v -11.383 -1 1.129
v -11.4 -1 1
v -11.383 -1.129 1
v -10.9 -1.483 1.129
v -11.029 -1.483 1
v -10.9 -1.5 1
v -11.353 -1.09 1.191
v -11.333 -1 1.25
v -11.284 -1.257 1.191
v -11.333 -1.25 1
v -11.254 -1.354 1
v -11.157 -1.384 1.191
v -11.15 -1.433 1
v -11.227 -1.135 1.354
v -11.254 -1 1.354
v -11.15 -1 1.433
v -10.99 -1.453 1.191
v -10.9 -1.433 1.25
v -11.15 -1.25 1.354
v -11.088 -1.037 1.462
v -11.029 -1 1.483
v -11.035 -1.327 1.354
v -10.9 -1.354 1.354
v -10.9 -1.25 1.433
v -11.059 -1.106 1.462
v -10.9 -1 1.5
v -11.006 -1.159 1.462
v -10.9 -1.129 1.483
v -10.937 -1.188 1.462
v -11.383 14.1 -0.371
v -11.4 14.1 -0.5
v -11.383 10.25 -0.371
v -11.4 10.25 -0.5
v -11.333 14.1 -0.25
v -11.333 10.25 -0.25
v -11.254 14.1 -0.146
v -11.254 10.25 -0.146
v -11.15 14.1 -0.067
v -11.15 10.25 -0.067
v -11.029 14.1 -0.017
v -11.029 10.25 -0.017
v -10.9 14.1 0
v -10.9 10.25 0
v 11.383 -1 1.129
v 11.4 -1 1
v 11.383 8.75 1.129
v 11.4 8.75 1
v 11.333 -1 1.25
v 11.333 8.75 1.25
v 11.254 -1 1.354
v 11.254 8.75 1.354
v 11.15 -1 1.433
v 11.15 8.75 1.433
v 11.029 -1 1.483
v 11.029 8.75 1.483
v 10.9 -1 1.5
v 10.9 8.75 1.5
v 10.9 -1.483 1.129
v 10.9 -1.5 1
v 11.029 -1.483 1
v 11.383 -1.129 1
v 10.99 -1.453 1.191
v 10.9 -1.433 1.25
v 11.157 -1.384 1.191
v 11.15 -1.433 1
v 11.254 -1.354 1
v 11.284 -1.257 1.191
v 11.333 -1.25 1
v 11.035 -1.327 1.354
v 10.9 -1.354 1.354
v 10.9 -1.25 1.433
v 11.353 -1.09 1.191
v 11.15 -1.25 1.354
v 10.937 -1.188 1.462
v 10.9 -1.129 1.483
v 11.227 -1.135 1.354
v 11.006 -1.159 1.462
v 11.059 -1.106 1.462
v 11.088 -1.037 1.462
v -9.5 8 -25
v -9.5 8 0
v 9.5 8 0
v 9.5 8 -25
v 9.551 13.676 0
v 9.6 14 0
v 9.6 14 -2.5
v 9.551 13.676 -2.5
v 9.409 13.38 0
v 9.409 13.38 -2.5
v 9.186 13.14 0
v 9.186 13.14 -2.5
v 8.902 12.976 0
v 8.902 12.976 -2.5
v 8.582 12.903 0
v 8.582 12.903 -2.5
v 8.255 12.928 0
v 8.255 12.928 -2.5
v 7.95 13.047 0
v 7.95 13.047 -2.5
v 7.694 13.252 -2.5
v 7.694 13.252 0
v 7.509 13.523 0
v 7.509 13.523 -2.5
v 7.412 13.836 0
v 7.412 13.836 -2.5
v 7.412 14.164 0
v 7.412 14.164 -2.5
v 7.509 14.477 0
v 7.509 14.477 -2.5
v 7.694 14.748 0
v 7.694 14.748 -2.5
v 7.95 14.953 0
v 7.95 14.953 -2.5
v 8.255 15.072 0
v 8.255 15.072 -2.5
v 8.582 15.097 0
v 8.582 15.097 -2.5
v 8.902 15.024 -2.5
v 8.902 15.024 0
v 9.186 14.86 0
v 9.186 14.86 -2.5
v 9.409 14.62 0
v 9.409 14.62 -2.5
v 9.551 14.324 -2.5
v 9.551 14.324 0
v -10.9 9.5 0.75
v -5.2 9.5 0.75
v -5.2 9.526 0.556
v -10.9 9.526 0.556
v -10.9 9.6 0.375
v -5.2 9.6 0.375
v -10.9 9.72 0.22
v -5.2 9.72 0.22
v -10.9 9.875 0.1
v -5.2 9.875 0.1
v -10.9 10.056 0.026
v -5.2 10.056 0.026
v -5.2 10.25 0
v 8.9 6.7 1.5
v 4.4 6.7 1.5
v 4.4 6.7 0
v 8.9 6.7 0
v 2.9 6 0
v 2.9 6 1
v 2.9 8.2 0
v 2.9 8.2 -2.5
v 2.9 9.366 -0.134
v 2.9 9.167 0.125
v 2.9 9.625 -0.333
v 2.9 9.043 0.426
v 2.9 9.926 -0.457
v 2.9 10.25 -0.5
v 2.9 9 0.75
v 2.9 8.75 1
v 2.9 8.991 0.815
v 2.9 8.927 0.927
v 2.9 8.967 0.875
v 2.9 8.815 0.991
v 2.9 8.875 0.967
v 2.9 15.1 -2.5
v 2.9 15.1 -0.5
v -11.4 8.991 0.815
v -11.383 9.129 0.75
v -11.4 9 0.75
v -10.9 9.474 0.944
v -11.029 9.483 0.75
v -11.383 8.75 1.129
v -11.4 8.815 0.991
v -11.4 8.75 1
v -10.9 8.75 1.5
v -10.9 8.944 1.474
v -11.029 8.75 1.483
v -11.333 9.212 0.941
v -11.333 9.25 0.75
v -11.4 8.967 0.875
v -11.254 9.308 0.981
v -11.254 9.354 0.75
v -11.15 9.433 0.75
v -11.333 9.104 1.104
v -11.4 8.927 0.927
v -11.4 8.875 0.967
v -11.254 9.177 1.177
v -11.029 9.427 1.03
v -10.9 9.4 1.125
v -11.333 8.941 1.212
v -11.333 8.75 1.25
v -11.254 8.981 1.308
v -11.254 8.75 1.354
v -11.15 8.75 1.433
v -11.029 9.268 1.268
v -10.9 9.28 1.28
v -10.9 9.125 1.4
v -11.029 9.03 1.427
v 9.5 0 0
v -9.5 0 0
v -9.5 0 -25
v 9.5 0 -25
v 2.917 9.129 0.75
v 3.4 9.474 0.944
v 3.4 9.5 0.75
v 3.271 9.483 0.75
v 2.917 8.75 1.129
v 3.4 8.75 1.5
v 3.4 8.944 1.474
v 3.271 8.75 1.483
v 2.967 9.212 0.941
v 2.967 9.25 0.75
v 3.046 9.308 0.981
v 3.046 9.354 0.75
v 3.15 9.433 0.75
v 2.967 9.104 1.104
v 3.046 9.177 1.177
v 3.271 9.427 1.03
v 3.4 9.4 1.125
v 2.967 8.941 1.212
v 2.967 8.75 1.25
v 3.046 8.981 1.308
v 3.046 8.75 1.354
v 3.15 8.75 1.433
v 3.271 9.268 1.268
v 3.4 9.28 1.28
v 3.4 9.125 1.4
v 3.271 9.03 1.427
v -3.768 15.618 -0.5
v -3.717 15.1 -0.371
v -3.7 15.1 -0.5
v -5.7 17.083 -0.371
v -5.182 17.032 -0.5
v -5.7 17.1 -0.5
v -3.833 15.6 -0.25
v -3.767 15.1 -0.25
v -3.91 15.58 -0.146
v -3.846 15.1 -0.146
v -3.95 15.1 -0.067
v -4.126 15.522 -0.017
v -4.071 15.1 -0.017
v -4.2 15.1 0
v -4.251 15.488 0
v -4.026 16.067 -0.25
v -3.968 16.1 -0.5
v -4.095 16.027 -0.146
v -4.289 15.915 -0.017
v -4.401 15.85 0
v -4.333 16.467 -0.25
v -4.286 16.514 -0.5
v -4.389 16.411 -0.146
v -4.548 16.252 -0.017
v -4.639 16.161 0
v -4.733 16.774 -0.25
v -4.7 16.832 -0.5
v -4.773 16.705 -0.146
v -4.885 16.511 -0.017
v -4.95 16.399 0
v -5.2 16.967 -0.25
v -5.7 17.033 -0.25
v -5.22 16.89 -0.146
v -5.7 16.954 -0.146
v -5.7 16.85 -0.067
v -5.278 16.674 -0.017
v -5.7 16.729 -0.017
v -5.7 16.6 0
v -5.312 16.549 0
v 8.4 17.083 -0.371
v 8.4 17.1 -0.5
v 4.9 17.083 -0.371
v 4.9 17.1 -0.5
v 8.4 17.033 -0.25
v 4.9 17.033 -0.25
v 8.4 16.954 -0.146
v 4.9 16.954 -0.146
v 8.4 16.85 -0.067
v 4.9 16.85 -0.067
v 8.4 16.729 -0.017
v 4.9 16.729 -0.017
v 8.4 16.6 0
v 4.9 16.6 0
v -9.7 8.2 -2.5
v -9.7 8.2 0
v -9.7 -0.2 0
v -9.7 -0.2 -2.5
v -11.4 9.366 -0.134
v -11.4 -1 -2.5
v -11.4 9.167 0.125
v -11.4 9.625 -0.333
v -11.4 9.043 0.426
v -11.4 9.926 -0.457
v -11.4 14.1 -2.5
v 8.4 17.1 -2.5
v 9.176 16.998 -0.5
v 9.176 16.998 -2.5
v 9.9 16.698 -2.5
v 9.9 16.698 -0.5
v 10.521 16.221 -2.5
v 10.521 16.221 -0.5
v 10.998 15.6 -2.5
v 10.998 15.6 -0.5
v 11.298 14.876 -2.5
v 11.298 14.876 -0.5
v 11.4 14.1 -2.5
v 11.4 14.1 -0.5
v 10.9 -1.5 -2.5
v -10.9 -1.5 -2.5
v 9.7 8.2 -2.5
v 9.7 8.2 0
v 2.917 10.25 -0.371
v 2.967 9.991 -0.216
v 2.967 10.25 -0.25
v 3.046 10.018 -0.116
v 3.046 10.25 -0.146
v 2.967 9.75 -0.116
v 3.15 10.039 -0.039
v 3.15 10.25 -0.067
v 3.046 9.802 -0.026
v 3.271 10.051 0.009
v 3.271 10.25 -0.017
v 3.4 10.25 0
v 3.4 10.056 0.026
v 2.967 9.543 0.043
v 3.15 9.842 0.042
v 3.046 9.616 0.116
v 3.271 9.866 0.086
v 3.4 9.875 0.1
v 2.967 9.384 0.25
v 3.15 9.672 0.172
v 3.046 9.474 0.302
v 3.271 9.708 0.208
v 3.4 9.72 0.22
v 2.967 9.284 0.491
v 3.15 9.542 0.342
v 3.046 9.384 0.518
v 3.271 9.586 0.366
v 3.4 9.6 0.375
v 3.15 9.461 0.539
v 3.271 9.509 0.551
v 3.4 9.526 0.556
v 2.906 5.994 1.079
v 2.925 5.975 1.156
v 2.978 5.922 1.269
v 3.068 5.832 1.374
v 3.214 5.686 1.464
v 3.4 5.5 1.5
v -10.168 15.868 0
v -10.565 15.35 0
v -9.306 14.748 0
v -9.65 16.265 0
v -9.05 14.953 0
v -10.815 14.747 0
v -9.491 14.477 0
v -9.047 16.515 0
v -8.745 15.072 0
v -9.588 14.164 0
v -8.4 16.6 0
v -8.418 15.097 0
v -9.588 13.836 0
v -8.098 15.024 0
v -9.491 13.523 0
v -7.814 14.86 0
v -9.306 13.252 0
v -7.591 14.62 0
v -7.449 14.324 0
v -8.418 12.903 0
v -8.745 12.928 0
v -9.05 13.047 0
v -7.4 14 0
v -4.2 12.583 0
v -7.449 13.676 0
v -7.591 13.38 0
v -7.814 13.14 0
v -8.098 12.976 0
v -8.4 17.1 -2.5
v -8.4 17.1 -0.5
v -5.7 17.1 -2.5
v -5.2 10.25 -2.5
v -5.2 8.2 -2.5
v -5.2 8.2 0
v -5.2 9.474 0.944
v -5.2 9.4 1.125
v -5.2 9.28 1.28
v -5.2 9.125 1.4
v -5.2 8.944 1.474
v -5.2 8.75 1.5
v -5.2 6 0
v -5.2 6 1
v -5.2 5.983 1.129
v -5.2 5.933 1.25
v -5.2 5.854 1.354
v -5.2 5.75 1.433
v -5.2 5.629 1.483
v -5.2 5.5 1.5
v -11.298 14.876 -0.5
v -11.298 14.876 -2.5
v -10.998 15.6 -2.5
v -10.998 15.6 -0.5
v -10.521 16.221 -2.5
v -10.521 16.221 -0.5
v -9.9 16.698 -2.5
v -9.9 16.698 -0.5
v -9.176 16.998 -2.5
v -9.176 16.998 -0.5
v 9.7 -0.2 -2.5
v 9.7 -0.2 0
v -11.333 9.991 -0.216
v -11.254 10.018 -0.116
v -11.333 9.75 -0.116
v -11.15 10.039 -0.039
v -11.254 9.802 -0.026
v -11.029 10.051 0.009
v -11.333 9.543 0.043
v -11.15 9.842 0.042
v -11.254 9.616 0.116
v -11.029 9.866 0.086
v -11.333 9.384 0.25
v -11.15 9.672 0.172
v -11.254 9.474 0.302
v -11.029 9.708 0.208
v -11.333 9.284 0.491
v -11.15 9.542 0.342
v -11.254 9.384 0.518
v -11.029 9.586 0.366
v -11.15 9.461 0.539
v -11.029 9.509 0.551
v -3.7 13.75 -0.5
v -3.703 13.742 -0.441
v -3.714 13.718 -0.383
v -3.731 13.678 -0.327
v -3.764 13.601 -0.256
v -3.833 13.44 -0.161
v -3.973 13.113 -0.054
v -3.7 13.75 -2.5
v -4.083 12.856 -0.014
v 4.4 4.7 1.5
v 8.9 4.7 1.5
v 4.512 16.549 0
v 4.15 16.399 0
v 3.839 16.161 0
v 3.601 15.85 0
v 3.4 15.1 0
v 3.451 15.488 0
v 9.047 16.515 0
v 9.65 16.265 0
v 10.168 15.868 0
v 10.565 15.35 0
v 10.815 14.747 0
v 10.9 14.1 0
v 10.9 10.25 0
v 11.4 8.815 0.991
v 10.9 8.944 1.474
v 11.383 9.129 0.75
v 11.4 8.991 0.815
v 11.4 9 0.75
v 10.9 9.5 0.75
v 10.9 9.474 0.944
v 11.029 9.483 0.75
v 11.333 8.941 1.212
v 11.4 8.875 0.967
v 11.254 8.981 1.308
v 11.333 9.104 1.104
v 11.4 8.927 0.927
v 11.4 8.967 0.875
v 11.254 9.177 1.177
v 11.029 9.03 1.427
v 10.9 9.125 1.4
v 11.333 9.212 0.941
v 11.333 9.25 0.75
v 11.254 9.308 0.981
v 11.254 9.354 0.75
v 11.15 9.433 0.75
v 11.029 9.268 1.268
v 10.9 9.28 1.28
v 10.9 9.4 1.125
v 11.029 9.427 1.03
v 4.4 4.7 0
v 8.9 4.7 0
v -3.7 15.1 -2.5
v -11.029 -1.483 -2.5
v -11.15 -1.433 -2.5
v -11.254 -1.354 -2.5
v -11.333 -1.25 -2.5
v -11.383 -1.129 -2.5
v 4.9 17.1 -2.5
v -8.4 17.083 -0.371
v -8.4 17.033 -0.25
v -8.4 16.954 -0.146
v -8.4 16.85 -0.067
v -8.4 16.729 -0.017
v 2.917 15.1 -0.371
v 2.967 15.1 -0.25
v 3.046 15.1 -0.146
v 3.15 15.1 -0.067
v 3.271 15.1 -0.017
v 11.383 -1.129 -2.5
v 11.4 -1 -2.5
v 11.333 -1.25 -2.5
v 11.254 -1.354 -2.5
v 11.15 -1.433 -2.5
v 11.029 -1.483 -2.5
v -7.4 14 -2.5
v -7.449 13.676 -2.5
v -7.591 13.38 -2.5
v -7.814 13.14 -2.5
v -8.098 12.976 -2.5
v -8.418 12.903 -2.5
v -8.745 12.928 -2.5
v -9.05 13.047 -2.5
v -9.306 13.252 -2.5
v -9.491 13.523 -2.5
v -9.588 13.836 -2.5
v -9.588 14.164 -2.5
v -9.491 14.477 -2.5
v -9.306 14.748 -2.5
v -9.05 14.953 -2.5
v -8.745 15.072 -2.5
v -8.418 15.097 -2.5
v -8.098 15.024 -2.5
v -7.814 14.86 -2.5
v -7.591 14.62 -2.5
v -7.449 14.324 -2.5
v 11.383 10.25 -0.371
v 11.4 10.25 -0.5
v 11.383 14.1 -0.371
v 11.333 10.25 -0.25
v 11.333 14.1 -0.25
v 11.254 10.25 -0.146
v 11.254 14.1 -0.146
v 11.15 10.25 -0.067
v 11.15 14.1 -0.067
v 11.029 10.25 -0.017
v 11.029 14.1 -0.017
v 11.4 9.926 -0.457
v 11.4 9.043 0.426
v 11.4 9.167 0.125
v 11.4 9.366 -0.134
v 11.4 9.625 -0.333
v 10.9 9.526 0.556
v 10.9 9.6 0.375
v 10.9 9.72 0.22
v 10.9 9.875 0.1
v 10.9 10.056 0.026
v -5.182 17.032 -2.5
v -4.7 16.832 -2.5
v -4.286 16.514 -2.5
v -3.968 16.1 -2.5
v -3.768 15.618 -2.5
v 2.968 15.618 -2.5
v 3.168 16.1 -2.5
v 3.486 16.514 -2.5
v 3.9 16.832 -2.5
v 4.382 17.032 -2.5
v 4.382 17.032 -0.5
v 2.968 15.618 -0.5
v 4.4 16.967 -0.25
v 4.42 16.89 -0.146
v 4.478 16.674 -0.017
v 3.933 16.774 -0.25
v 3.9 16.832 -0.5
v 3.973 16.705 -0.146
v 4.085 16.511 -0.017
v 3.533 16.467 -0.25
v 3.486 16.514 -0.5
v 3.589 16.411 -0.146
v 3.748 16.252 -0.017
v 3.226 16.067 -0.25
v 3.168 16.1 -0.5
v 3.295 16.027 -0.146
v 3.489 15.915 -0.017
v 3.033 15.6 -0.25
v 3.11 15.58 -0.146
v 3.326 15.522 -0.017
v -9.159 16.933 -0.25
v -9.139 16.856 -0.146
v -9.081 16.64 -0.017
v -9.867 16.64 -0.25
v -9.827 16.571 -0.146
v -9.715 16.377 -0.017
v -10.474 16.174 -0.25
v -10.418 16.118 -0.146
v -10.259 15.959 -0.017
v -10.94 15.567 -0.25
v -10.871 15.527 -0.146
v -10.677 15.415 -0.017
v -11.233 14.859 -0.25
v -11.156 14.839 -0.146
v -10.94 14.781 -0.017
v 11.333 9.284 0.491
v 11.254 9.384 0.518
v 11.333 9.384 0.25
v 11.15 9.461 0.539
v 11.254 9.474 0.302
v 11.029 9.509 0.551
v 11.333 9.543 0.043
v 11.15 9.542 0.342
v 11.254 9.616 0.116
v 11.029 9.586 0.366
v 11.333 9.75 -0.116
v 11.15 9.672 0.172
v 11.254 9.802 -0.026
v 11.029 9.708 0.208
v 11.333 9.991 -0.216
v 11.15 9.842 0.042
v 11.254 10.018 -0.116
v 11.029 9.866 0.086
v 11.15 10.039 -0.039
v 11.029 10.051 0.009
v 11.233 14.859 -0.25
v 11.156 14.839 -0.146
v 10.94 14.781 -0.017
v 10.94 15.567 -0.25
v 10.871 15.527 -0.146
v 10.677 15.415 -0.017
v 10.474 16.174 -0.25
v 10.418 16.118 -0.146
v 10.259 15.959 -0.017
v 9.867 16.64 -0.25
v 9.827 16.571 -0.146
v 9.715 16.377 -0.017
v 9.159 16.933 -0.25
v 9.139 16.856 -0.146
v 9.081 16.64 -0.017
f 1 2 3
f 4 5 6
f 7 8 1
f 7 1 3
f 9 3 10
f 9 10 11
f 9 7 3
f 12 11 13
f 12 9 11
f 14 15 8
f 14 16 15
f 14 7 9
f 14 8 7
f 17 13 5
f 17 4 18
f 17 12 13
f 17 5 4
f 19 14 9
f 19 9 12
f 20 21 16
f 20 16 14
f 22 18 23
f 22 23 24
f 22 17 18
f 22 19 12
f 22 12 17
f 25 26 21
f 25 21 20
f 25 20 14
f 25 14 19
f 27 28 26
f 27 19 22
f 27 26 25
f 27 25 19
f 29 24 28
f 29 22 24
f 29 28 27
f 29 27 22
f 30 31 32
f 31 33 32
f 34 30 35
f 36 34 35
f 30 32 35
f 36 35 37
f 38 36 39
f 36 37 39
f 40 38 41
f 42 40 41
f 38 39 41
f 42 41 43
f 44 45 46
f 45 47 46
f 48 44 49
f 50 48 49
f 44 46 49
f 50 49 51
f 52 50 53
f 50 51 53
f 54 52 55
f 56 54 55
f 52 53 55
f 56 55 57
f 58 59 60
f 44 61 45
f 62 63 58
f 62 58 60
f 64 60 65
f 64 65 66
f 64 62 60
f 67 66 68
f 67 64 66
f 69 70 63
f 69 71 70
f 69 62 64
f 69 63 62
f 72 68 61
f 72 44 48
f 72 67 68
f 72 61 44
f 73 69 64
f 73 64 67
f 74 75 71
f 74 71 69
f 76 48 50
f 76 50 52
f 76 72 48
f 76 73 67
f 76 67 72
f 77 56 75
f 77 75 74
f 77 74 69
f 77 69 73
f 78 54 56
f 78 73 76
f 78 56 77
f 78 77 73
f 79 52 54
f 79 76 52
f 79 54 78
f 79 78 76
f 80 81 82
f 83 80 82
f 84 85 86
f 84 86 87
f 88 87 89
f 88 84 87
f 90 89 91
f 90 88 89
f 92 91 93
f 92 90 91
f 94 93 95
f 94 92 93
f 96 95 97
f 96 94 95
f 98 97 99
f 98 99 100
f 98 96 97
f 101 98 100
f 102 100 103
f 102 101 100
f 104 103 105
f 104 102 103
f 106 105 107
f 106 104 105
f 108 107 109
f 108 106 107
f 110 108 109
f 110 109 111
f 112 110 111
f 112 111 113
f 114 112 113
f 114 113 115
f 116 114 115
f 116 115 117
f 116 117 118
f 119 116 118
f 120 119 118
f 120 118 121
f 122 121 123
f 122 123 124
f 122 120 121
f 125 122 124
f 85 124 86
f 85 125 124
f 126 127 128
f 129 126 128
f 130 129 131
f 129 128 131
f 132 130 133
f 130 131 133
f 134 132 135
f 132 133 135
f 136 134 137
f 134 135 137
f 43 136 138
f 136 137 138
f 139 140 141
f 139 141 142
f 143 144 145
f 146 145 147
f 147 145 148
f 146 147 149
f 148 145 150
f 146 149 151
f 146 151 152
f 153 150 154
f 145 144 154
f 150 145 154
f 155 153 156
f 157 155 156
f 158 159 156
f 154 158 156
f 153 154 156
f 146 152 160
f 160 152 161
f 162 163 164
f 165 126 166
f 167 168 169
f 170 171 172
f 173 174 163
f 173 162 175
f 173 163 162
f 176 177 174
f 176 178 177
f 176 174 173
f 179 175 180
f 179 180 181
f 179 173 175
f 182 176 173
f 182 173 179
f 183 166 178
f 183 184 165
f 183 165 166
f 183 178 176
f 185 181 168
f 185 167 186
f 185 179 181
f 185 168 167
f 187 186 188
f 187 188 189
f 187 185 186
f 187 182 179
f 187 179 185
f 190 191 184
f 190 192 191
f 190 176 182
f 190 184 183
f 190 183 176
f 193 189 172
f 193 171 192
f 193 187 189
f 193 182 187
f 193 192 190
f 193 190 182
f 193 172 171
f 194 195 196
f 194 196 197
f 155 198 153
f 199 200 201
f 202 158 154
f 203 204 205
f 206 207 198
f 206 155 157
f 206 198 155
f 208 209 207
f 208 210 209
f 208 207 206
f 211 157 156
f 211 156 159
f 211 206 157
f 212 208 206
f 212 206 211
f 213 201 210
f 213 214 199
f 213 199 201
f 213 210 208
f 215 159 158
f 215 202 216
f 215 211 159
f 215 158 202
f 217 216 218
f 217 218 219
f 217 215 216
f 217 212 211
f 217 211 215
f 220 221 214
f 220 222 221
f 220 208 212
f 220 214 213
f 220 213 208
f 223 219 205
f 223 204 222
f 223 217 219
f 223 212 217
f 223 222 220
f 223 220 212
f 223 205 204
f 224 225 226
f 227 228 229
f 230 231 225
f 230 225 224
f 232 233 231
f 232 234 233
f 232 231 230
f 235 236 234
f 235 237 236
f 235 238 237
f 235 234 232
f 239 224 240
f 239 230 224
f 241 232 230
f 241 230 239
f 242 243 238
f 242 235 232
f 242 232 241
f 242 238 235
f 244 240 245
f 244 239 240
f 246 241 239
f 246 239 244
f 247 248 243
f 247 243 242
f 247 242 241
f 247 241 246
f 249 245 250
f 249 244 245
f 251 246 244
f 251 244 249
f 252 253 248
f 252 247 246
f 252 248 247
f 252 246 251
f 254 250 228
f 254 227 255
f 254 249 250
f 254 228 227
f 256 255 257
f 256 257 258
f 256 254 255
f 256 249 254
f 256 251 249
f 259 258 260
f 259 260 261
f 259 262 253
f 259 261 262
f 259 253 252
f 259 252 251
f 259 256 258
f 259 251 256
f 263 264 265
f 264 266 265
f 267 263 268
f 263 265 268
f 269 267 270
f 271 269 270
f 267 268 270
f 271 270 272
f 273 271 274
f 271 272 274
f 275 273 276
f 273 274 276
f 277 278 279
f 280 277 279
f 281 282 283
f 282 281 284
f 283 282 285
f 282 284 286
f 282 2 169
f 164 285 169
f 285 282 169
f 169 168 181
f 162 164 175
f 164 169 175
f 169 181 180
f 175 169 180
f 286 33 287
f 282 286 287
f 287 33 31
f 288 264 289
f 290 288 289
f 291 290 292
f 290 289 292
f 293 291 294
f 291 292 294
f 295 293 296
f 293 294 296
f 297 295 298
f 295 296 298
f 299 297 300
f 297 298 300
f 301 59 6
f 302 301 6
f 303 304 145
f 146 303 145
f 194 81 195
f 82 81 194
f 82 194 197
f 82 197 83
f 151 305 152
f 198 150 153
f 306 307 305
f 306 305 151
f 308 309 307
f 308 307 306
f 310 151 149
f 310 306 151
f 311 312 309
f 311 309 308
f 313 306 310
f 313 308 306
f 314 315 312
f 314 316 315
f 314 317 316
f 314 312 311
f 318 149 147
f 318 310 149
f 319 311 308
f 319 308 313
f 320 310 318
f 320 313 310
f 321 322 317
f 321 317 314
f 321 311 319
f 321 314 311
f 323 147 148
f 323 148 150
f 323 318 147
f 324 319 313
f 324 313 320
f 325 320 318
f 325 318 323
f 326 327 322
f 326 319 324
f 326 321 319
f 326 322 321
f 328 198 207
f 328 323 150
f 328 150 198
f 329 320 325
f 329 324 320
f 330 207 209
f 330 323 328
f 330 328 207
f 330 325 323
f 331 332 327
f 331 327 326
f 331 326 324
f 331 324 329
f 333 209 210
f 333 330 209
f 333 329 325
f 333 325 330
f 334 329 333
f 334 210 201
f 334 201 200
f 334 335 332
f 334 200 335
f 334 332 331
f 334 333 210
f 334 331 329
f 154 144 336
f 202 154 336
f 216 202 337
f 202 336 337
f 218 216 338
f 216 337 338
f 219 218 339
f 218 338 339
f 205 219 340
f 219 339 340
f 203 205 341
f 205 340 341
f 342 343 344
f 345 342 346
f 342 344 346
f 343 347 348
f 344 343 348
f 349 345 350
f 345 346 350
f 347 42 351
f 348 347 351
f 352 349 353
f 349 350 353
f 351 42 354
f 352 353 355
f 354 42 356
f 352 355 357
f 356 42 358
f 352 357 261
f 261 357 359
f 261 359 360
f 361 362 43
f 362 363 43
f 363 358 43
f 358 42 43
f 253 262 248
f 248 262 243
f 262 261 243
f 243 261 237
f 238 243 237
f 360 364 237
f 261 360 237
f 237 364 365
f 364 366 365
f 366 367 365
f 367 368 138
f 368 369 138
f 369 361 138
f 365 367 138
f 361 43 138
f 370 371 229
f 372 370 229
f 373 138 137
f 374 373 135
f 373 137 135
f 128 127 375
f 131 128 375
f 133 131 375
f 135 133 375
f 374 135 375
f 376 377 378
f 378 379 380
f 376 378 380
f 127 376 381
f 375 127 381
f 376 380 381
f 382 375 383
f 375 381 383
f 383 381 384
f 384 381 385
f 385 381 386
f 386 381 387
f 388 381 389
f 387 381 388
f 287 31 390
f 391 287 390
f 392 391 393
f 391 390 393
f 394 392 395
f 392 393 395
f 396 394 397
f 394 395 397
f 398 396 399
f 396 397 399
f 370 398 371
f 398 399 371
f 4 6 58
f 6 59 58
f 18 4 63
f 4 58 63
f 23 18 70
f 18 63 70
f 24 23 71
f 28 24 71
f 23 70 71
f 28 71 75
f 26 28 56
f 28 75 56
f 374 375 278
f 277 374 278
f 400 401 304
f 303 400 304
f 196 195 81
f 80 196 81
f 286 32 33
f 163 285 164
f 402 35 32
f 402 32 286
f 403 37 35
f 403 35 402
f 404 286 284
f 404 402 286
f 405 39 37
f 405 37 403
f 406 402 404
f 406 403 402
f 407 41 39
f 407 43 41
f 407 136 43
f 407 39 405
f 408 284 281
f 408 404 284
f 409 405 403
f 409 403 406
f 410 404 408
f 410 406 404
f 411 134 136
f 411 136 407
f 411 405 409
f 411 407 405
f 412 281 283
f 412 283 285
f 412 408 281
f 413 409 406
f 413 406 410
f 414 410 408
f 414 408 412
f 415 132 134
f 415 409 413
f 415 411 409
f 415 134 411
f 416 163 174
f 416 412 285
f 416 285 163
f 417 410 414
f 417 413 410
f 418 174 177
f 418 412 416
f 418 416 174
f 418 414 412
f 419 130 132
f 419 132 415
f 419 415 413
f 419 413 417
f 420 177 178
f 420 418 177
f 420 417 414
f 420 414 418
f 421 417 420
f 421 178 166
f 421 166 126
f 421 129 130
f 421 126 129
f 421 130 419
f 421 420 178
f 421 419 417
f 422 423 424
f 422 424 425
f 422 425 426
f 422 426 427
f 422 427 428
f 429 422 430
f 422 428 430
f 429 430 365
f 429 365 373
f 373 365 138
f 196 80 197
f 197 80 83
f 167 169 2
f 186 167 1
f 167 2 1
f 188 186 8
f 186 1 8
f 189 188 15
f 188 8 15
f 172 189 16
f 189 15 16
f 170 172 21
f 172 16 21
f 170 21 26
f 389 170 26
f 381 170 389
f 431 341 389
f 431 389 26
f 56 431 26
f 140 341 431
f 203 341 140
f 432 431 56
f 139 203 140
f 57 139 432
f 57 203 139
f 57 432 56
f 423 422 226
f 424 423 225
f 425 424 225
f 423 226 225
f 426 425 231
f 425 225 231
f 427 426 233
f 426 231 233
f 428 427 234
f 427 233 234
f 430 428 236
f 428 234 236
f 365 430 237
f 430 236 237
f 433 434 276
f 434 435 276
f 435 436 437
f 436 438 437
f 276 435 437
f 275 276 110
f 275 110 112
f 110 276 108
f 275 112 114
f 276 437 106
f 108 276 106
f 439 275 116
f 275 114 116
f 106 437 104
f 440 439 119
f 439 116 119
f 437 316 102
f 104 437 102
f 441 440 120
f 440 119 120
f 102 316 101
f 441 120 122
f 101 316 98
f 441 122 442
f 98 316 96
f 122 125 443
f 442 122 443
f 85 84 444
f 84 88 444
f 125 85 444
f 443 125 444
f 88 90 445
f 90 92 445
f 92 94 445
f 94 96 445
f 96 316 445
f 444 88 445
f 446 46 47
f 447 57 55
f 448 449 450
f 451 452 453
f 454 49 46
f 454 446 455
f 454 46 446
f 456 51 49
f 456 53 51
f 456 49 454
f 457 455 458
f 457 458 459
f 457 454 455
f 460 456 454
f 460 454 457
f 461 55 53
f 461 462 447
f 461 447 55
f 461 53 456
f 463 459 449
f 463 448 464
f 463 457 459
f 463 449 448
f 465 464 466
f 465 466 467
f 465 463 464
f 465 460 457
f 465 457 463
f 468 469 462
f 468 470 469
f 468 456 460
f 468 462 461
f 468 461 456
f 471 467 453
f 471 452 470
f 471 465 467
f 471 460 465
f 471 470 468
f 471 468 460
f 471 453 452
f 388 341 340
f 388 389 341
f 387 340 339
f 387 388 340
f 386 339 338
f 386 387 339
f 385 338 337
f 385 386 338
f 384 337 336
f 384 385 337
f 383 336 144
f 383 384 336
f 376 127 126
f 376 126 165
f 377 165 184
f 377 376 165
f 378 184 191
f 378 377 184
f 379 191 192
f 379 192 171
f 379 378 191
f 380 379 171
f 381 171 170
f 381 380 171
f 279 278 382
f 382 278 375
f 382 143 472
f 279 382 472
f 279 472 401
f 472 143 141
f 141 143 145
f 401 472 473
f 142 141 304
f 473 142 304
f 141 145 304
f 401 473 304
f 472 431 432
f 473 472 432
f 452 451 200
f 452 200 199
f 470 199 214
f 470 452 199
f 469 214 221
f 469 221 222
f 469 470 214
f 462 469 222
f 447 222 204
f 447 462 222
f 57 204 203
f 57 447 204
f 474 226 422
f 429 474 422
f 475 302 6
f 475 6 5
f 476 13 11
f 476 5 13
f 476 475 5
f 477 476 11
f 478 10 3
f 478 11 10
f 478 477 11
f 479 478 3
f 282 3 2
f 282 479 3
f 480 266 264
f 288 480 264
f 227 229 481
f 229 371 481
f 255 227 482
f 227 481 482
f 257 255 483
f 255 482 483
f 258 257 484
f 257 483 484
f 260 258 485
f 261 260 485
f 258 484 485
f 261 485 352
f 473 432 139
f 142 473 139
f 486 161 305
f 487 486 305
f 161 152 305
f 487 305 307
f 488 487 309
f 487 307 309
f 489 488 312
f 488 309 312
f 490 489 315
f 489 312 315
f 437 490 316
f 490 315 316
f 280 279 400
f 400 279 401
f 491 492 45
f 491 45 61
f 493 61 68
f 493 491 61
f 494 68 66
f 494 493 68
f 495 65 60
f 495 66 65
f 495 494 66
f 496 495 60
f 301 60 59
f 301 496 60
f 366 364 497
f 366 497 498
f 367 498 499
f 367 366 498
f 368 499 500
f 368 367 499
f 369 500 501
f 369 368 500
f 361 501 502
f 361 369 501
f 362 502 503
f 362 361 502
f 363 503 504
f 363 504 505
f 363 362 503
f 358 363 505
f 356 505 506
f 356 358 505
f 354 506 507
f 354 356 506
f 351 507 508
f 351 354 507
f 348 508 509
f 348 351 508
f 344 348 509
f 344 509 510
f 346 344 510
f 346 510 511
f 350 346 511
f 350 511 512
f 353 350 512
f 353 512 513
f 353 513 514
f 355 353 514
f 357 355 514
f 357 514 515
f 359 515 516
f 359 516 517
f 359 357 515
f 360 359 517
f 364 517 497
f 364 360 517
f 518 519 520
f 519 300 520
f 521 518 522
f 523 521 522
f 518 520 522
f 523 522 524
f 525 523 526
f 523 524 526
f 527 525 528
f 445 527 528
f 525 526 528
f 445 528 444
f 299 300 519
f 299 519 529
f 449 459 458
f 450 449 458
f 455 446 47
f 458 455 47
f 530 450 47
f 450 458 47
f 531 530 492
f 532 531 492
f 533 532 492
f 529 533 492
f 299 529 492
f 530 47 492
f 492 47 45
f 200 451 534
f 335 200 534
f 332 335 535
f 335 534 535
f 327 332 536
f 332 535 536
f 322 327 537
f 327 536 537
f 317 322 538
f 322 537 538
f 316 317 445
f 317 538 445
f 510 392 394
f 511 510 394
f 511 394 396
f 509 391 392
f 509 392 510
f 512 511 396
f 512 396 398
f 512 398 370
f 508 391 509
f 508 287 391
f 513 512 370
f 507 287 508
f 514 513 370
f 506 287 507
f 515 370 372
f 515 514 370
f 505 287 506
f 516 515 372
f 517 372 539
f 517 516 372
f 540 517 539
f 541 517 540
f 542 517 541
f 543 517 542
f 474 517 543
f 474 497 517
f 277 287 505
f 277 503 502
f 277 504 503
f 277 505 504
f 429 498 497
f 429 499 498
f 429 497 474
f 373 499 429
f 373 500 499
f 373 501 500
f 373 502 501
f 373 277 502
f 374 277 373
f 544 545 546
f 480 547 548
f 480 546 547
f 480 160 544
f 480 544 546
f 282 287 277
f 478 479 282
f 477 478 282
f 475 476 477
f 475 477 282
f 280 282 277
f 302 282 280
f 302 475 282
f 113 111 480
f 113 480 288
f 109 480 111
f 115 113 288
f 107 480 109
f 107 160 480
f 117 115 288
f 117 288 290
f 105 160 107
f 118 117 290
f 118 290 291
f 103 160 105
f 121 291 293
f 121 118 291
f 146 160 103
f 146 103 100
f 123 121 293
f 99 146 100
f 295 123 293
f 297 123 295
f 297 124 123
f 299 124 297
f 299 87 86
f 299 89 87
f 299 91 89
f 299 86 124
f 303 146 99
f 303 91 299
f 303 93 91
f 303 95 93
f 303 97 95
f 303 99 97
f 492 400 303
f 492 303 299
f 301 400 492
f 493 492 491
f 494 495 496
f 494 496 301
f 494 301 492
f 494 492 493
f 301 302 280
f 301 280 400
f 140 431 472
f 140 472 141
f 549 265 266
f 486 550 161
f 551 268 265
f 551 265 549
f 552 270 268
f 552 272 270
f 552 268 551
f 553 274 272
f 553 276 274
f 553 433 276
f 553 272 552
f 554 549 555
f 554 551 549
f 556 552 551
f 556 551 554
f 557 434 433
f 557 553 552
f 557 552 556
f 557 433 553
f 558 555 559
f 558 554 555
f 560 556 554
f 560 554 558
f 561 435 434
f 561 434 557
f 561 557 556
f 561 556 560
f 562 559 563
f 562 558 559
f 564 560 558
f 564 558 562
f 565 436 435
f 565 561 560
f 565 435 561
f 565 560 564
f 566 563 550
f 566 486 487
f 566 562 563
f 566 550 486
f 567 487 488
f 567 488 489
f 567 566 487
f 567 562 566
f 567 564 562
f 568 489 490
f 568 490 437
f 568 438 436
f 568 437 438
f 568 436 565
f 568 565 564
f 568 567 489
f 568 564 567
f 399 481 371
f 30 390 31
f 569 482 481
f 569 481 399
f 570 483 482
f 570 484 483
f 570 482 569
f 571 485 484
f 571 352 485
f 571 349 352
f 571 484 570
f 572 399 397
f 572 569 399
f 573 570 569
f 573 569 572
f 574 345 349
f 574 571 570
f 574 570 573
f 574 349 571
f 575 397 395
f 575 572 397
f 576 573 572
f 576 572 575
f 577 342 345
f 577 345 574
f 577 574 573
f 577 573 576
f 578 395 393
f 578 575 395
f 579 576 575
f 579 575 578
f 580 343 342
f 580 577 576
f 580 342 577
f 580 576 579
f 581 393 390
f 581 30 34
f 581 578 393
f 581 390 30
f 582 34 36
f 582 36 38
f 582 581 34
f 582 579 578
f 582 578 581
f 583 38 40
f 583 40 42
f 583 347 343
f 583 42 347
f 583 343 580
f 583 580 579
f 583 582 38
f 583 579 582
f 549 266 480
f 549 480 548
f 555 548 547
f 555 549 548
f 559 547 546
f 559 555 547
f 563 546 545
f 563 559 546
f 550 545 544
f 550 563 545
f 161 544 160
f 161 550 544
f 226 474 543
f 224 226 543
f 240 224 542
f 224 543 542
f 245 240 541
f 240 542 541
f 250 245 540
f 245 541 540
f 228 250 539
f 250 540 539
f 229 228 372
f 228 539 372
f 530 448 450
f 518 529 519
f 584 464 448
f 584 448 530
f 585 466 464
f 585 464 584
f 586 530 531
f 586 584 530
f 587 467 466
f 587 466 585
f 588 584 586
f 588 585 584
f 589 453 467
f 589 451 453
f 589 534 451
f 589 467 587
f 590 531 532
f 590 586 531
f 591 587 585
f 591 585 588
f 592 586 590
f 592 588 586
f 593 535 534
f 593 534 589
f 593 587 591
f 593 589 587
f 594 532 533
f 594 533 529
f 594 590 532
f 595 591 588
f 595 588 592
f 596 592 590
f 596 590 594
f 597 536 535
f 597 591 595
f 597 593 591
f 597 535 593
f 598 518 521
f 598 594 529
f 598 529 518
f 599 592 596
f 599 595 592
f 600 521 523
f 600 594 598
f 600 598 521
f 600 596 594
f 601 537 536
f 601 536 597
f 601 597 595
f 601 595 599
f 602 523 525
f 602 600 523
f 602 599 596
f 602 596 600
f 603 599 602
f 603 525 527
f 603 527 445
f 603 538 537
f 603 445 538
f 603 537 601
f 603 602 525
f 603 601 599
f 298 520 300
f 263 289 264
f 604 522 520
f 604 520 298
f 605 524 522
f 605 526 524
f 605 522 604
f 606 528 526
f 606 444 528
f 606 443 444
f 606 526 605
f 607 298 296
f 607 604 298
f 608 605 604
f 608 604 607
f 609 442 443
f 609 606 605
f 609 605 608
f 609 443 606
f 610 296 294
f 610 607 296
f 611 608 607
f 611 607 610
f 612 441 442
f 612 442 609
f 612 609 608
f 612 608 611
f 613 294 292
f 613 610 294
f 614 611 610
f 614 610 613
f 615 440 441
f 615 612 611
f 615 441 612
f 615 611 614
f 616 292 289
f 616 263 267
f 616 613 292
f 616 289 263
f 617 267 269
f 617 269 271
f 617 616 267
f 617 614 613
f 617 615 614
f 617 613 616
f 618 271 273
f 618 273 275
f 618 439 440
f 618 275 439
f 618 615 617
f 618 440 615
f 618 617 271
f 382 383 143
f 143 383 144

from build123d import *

# Parameters (mm, degrees)
F0_W      = 19
F0_H      = 8
F1_DEPTH  = 25
F2_W      = 22.8
F2_H      = 11
F3_DEPTH  = 1.5
F5_DEPTH  = 2.5
F6_R      = 1.1
F7_DEPTH  = 2.5
F8_R      = 0.74999
F10_DEPTH = 12.5
F11_R     = 2
F12_W     = 4.5
F12_H     = 2
F13_DEPTH = 25
F14_R     = 0.5
F15_R     = 0.5
F16_R     = 0.5


# Not quite as in the source:
# - a fillet or chamfer is up to 0.001 mm smaller than in the source, because OpenCascade refuses the exact size


with BuildPart() as f1:
    # F0 (on Top) → F1 (new body)
    with BuildSketch(Plane.XY):
        with Locations((0, 4)):
            Rectangle(F0_W, F0_H)
    extrude(amount=-F1_DEPTH)


with BuildPart() as f3:
    # F2 (on Top) → F3 (new body)
    with BuildSketch(Plane.XY):
        with Locations((0, 4)):
            Rectangle(F2_W, F2_H)
    extrude(amount=F3_DEPTH)

    # F4 (on face) → F5 (join)
    with BuildSketch(Plane(origin=(0, 0, 0), x_dir=(1, 0, 0), z_dir=(0, 0, -1))):
        Polygon((9.7, -9.5), (11.4, -9.5), (11.4, 1.5), (-11.4, 1.5), (-11.4, -9.5), (-9.7, -9.5), (-9.7, 0.2), (9.7, 0.2), align=None)
    extrude(amount=F5_DEPTH)

    # F6 (on face) → F7 (join)
    with BuildSketch(Plane(origin=(0, 0, 0), x_dir=(1, 0, 0), z_dir=(0, 0, -1))):
        with BuildLine():
            Line((11.4, -14.1), (11.4, -8.2))
            Line((11.4, -8.2), (-11.4, -8.2))
            Line((-11.4, -8.2), (-11.4, -14.1))
            ThreePointArc((-11.4, -14.1), (-10.5213203436, -16.2213203436), (-8.4, -17.1))
            Line((-8.4, -17.1), (8.4, -17.1))
            ThreePointArc((8.4, -17.1), (10.5213203436, -16.2213203436), (11.4, -14.1))
        make_face()
        with Locations((-8.5, -14)):
            Circle(F6_R, mode=Mode.SUBTRACT)
        with Locations((8.5, -14)):
            Circle(F6_R, mode=Mode.SUBTRACT)
    extrude(amount=F7_DEPTH)

    # F8 (radius 0.75 in the source; OpenCascade refuses exactly that, so slightly less here)
    f8_edges = [f3.edges().sort_by_distance(p)[0] for p in [
        (0, 9.5, 0),
        (0, 9.5, 1.5),
    ]]
    fillet(f8_edges, radius=F8_R)

    # F9 (on Top) → F10 (cut, symmetric)
    with BuildSketch(Plane.XY):
        Polygon((2.9, 6), (2.9, 23.4100954436), (-3.7, 23.4100954436), (-3.7, 13.75), (-5.2, 10.25), (-5.2, 6), align=None)
    extrude(amount=F10_DEPTH, both=True, mode=Mode.SUBTRACT)

    # F11
    f11_edges = [f3.edges().sort_by_distance(p)[0] for p in [
        (-3.7, 17.1, -1.25),
        (2.9, 17.1, -1.25),
    ]]
    fillet(f11_edges, radius=F11_R)

    # F12 (on face) → F13 (cut)
    with BuildSketch(Plane.XY.offset(1.5)):
        with Locations((6.65, 5.7)):
            Rectangle(F12_W, F12_H)
    extrude(amount=-F13_DEPTH, mode=Mode.SUBTRACT)

    # F14
    f14_edges = [f3.edges().sort_by_distance(p)[0] for p in [
        (11.4, -1.5, -0.5),
        (-11.4, -1.5, -0.5),
    ]]
    fillet(f14_edges, radius=F14_R)

    # F15
    f15_edges = [f3.edges().sort_by_distance(p)[0] for p in [
        (11.4, 3.875005, 1.5),
    ]]
    fillet(f15_edges, radius=F15_R)

    # F16
    f16_edges = [f3.edges().sort_by_distance(p)[0] for p in [
        (-1.15, 6, 1.5),
    ]]
    fillet(f16_edges, radius=F16_R)


solid = Compound([f1.part, f3.part])
